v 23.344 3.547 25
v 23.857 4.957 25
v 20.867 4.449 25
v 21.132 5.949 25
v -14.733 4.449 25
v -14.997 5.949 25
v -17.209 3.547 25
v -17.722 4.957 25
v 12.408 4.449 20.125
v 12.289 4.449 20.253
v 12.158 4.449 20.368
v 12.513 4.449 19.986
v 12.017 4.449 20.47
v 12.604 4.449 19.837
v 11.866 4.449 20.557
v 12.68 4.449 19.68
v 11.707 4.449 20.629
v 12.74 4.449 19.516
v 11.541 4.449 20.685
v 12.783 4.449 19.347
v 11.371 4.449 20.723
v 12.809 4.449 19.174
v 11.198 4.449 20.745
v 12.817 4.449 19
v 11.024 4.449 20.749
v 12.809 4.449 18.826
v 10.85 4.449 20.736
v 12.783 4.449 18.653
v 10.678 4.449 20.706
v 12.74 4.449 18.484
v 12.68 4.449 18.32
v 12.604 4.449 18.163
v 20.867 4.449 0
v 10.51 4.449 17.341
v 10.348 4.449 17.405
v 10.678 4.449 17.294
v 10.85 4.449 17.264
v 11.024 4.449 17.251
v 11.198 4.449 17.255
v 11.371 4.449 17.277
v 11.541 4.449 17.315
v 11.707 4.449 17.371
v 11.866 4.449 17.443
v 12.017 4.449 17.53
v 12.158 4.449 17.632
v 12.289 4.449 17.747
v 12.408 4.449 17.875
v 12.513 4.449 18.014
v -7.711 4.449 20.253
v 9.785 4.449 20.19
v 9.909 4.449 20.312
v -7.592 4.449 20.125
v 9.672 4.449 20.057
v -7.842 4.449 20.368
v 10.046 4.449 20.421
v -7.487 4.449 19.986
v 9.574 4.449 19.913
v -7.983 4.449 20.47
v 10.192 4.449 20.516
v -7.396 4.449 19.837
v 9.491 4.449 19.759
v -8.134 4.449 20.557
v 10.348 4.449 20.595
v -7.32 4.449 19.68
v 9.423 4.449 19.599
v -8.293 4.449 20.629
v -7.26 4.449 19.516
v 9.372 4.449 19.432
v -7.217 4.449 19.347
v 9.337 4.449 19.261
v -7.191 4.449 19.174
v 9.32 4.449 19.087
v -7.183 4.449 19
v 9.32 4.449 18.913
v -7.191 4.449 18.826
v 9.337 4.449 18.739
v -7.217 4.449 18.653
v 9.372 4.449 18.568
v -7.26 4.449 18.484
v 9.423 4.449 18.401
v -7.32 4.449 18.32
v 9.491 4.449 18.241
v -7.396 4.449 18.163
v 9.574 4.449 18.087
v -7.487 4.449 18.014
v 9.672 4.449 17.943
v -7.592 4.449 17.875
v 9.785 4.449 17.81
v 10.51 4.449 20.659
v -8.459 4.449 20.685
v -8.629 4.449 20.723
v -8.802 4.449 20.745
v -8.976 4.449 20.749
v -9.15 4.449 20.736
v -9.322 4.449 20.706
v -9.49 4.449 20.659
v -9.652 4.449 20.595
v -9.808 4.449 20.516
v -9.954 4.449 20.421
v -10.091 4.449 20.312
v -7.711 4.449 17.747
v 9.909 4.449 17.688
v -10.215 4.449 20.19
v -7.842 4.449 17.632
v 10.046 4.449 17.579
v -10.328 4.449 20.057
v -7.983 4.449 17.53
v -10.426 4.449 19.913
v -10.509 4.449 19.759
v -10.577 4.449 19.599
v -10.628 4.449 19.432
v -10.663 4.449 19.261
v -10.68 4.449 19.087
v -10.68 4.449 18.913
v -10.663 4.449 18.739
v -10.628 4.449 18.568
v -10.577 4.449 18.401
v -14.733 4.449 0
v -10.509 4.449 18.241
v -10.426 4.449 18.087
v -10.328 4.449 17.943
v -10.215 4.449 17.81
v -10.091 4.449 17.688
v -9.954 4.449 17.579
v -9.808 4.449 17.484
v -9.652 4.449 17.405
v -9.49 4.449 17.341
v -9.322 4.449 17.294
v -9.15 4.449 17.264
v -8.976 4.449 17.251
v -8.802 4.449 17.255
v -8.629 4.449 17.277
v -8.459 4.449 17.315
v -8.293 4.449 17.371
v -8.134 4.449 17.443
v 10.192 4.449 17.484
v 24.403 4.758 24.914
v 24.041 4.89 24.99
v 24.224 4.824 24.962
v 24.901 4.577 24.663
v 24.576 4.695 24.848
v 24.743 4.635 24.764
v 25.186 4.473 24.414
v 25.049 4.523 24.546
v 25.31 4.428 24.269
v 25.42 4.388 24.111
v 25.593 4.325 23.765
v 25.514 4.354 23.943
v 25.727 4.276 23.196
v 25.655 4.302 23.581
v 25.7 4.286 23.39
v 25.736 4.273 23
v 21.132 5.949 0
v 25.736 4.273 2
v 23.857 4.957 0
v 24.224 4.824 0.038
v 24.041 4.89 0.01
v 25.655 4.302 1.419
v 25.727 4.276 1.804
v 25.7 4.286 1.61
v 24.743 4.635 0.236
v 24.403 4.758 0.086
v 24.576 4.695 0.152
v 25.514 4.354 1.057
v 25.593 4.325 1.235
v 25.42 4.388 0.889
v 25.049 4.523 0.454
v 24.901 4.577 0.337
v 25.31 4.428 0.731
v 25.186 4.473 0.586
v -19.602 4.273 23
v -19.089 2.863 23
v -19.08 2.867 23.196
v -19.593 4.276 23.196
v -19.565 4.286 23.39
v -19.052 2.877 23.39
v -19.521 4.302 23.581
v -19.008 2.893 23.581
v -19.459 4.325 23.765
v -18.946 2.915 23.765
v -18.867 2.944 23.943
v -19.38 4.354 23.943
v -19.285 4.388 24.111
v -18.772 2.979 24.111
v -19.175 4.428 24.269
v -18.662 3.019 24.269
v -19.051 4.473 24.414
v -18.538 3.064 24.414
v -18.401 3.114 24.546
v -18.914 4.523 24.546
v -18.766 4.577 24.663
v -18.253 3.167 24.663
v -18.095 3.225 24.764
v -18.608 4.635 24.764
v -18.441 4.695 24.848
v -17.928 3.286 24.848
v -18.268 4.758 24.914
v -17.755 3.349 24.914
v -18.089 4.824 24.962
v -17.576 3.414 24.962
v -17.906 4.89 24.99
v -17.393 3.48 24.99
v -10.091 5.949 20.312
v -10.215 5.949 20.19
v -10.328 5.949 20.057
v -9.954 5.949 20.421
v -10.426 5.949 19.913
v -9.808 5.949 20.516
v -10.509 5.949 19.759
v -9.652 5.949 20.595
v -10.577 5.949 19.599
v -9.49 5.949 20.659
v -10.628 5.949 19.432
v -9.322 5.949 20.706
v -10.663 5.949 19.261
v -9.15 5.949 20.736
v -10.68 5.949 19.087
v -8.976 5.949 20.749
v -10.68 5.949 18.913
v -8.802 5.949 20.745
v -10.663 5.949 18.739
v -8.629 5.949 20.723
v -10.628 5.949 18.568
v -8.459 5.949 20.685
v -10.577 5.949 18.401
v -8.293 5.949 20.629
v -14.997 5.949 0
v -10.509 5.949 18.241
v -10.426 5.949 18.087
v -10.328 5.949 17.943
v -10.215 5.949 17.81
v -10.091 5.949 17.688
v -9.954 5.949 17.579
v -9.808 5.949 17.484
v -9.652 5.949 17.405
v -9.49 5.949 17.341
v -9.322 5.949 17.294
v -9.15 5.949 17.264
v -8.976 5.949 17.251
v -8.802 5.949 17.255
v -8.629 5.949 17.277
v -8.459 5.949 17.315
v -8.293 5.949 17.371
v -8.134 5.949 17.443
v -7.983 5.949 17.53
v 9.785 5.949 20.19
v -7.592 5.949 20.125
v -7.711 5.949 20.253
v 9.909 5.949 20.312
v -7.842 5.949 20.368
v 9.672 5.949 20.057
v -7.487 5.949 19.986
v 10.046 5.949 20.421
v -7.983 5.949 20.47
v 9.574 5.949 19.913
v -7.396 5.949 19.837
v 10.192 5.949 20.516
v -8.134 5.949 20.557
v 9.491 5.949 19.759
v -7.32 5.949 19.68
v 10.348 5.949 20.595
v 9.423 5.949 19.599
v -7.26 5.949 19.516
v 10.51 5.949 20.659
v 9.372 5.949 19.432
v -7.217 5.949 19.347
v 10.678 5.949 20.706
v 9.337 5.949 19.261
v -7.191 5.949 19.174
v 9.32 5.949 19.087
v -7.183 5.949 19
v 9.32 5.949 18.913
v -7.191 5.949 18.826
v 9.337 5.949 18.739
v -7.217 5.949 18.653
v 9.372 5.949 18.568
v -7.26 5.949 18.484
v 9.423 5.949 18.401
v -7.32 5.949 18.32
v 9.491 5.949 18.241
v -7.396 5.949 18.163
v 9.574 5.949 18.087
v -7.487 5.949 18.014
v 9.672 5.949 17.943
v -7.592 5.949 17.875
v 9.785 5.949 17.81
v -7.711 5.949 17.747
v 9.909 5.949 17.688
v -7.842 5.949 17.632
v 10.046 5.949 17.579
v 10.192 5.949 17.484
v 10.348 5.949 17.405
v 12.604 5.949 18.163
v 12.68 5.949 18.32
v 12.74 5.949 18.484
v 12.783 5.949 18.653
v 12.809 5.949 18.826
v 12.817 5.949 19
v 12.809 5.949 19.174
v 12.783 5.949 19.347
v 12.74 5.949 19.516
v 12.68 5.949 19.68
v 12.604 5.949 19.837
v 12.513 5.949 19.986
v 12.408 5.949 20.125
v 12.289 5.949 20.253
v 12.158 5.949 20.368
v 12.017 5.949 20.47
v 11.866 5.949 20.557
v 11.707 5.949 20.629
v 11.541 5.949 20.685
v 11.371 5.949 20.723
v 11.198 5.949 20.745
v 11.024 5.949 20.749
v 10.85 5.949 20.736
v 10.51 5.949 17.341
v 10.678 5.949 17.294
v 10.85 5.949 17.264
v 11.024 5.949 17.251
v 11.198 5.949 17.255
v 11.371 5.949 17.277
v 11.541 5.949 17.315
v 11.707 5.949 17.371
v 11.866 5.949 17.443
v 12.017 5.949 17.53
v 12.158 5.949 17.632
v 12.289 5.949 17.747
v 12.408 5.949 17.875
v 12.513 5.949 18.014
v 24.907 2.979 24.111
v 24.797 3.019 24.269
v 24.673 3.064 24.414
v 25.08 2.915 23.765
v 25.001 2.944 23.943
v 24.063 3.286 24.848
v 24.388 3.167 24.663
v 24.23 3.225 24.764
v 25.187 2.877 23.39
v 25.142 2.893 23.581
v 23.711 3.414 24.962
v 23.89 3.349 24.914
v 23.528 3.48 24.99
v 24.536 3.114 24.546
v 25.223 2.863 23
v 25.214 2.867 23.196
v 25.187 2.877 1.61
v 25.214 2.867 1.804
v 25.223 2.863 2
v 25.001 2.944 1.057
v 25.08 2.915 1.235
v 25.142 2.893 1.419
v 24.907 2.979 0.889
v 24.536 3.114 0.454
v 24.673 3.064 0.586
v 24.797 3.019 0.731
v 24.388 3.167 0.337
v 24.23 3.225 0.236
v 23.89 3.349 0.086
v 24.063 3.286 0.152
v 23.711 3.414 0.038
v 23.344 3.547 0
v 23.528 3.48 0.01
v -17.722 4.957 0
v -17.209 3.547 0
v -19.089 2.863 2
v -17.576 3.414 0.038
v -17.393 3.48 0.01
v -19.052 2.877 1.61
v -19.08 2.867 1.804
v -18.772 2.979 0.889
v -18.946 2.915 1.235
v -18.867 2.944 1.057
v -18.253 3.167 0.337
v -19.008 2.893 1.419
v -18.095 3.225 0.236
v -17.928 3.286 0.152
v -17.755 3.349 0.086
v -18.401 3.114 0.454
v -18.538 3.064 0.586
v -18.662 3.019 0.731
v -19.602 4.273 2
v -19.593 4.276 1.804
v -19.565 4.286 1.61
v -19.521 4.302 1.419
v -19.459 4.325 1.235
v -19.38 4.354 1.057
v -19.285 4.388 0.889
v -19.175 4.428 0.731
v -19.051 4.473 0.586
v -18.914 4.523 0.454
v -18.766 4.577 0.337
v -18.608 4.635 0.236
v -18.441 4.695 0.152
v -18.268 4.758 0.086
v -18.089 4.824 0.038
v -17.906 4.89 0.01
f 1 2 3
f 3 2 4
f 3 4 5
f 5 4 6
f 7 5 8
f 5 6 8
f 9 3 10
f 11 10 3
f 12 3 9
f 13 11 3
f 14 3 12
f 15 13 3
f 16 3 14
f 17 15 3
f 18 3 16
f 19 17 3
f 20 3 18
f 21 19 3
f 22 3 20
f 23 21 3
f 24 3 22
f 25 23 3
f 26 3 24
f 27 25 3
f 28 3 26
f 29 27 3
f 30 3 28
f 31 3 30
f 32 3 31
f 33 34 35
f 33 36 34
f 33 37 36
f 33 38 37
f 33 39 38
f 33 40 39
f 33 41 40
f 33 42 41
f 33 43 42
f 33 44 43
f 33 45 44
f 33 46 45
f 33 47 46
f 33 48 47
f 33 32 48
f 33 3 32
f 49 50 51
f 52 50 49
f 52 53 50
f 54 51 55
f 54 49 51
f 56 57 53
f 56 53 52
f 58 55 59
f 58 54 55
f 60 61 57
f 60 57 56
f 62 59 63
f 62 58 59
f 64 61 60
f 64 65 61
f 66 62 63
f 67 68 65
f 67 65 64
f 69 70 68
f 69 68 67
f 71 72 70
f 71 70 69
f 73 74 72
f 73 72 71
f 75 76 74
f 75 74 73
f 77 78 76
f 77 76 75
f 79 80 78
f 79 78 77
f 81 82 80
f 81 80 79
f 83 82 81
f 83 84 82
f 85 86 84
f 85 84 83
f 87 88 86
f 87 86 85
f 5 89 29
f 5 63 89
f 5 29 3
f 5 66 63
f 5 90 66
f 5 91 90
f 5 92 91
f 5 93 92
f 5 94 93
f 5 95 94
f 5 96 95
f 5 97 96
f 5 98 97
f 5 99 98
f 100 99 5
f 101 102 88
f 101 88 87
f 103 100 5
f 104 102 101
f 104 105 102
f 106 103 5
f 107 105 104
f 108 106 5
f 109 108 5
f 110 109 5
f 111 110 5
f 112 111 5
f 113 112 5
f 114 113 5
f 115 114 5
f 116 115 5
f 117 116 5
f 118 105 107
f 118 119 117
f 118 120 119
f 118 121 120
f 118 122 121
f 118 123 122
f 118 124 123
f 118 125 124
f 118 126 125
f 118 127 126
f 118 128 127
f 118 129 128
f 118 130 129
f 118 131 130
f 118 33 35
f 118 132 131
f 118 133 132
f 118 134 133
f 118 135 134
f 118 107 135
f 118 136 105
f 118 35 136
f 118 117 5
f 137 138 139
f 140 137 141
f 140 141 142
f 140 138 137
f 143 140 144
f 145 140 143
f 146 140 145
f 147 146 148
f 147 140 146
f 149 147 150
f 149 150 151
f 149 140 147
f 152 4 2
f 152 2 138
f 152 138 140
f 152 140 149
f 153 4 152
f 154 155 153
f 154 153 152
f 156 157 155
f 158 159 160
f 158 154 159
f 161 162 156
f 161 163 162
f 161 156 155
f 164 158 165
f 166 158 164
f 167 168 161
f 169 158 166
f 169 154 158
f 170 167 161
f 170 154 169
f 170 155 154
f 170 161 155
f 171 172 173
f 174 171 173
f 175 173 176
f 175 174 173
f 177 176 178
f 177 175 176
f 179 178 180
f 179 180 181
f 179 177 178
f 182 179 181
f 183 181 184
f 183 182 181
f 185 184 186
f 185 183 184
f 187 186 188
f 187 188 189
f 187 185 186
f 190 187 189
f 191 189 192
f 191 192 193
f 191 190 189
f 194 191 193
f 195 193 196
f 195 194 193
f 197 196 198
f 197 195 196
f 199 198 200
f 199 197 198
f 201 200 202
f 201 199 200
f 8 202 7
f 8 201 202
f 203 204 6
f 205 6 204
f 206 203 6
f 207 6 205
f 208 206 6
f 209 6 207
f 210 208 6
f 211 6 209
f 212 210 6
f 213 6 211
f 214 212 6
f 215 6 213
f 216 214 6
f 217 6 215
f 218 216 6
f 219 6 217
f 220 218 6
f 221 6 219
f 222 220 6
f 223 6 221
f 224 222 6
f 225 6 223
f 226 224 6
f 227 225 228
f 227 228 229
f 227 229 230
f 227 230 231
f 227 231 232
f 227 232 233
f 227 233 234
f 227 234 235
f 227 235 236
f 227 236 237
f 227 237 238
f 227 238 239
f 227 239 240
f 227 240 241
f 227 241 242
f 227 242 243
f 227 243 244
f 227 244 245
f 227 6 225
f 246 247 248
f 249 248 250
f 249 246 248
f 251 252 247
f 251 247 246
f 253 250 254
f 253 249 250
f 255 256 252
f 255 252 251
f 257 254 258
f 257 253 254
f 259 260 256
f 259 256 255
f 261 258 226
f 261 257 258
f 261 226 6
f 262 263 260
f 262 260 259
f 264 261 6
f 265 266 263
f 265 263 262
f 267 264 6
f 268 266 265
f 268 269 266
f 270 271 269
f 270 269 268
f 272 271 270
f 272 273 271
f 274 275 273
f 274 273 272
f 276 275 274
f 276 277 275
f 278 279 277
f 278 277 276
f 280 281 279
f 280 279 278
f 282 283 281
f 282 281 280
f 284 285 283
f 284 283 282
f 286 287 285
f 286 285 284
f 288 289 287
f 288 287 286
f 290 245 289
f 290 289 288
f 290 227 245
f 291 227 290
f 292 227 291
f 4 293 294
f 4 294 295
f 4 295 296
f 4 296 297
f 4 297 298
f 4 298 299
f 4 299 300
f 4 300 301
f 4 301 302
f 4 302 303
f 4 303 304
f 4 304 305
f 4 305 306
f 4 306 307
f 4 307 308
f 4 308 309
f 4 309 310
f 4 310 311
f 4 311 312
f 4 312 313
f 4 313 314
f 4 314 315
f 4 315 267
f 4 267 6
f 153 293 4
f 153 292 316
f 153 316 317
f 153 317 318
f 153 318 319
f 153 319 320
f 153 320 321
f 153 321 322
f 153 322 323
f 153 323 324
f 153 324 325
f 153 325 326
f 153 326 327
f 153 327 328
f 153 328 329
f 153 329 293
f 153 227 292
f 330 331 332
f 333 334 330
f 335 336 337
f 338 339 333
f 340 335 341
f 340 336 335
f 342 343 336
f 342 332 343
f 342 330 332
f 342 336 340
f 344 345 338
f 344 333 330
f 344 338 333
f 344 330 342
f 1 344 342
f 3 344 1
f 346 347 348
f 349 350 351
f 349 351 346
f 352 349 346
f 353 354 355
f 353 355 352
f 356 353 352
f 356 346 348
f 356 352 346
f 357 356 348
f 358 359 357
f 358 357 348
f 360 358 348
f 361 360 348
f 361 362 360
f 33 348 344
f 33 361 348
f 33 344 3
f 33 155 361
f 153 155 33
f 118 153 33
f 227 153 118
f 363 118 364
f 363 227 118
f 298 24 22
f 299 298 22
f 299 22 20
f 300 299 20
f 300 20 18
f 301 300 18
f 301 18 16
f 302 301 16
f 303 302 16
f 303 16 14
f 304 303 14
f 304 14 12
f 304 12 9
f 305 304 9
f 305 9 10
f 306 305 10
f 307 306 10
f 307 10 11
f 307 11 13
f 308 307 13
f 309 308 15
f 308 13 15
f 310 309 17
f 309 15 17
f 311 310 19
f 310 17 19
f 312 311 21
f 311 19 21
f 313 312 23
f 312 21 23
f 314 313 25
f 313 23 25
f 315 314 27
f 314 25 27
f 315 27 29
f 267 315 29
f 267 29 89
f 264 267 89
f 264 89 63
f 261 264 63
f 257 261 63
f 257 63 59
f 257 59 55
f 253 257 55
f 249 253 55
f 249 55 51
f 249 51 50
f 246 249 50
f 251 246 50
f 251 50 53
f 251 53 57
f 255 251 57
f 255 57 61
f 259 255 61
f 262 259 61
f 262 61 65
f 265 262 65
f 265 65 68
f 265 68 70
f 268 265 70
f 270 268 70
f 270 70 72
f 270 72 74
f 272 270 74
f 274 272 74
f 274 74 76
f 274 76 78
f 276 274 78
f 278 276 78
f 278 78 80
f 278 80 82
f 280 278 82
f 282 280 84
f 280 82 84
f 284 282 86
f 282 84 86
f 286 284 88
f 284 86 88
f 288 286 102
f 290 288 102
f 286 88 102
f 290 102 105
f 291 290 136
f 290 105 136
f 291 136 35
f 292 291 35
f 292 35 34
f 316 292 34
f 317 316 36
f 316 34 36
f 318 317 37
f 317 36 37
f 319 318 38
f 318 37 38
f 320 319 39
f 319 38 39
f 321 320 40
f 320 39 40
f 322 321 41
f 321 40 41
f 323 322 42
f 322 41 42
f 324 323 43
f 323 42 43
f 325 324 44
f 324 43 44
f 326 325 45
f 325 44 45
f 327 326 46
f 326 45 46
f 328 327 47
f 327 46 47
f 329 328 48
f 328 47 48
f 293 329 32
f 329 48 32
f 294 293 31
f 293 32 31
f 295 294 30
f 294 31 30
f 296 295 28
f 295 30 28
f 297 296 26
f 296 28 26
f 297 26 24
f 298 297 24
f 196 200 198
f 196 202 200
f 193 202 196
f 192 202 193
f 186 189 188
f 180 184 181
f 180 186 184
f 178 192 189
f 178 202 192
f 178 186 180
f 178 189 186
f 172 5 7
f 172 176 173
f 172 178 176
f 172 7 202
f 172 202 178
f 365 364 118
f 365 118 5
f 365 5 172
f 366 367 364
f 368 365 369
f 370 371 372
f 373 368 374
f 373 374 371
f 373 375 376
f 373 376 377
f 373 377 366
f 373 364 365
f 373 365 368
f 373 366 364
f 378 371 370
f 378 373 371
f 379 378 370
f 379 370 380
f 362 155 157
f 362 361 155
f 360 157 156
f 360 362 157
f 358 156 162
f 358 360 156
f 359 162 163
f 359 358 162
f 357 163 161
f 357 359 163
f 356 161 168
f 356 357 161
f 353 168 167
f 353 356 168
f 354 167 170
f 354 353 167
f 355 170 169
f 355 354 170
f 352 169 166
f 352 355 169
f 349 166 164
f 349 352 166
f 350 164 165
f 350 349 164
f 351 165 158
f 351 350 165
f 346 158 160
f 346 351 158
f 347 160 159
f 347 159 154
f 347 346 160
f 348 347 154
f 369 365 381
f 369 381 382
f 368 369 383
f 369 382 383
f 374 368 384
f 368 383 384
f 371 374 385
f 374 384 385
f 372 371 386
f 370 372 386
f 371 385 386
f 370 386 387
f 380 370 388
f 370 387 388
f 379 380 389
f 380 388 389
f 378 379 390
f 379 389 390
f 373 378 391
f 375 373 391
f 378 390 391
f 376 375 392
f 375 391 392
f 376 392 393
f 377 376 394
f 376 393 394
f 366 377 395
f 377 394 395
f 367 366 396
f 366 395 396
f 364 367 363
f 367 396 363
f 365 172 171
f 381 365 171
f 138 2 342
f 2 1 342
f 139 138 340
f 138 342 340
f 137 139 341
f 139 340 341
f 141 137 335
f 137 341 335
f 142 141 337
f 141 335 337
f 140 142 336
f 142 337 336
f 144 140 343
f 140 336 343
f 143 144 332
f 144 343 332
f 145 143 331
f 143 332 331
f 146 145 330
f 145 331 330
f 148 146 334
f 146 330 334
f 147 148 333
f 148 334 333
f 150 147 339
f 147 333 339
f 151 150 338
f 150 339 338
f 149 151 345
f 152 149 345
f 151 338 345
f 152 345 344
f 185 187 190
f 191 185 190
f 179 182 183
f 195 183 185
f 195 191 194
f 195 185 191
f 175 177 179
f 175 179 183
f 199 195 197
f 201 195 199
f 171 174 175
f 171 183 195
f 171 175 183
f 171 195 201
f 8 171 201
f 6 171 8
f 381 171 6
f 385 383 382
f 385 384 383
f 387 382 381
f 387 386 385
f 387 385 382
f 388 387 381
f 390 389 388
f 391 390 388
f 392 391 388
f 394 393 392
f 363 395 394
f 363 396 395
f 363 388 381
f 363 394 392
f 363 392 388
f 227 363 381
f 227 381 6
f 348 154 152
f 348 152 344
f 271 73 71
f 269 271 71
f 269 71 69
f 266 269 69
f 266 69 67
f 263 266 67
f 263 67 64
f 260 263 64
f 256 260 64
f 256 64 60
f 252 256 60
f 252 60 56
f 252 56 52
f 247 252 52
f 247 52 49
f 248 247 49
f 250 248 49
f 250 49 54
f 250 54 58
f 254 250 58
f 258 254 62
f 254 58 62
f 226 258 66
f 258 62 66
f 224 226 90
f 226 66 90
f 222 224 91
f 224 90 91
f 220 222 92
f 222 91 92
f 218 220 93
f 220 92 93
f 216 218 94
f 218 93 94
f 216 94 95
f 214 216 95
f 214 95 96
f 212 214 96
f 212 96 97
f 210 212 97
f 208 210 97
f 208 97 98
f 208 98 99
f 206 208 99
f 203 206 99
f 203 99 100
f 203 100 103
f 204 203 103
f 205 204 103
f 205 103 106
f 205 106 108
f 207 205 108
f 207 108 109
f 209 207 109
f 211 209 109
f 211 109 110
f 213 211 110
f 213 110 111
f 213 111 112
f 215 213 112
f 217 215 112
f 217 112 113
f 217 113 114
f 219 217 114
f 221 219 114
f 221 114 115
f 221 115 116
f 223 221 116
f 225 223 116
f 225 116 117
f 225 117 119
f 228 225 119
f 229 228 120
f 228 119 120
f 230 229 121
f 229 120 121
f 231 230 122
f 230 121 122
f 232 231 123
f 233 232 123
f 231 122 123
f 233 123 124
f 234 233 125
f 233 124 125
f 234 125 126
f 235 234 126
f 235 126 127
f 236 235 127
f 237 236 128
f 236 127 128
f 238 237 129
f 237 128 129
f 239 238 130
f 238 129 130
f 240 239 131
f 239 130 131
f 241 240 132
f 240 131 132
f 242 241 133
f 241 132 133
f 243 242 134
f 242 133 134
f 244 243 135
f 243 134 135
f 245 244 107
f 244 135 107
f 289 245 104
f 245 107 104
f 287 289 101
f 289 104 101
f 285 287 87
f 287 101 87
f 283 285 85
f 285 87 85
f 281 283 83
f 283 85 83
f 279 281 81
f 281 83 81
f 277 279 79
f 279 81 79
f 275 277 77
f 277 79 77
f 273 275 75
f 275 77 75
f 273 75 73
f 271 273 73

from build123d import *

# Parameters (mm, degrees)
BOSS_EXTRUDE1_DEPTH = 25
SKETCH2_R           = 1.75
CUT_EXTRUDE1_DEPTH  = 2.5
FILLET1_R           = 2


with BuildPart() as part:
    # Sketch1 → Boss-Extrude1 (new body)
    with BuildSketch(Plane.XY):
        Polygon((-19.601594954, 4.272951405), (-14.997101112, 5.948850108), (21.13187983, 5.948850108), (25.736373672, 4.272951405), (25.223343457, 2.863412474), (20.867389359, 4.448850108), (-14.732610641, 4.448850108), (-19.088564739, 2.863412474), align=None)
    extrude(amount=BOSS_EXTRUDE1_DEPTH)

    # Sketch2 → Cut-Extrude1 (cut, through all)
    with BuildSketch(Plane.XZ.offset(-4.448850108)):
        with Locations((-8.932610641, 19)):
            Circle(SKETCH2_R)
        with Locations((11.067389359, 19)):
            Circle(SKETCH2_R)
    extrude(amount=-CUT_EXTRUDE1_DEPTH, mode=Mode.SUBTRACT)

    # Fillet1
    fillet1_edges = [part.edges().sort_by_distance(p)[0] for p in [
        (-19.345079846, 3.56818194, 0),
        (25.479858564, 3.56818194, 25),
        (-19.345079846, 3.56818194, 25),
        (25.479858564, 3.56818194, 0),
    ]]
    fillet(fillet1_edges, radius=FILLET1_R)


solid = part.part
